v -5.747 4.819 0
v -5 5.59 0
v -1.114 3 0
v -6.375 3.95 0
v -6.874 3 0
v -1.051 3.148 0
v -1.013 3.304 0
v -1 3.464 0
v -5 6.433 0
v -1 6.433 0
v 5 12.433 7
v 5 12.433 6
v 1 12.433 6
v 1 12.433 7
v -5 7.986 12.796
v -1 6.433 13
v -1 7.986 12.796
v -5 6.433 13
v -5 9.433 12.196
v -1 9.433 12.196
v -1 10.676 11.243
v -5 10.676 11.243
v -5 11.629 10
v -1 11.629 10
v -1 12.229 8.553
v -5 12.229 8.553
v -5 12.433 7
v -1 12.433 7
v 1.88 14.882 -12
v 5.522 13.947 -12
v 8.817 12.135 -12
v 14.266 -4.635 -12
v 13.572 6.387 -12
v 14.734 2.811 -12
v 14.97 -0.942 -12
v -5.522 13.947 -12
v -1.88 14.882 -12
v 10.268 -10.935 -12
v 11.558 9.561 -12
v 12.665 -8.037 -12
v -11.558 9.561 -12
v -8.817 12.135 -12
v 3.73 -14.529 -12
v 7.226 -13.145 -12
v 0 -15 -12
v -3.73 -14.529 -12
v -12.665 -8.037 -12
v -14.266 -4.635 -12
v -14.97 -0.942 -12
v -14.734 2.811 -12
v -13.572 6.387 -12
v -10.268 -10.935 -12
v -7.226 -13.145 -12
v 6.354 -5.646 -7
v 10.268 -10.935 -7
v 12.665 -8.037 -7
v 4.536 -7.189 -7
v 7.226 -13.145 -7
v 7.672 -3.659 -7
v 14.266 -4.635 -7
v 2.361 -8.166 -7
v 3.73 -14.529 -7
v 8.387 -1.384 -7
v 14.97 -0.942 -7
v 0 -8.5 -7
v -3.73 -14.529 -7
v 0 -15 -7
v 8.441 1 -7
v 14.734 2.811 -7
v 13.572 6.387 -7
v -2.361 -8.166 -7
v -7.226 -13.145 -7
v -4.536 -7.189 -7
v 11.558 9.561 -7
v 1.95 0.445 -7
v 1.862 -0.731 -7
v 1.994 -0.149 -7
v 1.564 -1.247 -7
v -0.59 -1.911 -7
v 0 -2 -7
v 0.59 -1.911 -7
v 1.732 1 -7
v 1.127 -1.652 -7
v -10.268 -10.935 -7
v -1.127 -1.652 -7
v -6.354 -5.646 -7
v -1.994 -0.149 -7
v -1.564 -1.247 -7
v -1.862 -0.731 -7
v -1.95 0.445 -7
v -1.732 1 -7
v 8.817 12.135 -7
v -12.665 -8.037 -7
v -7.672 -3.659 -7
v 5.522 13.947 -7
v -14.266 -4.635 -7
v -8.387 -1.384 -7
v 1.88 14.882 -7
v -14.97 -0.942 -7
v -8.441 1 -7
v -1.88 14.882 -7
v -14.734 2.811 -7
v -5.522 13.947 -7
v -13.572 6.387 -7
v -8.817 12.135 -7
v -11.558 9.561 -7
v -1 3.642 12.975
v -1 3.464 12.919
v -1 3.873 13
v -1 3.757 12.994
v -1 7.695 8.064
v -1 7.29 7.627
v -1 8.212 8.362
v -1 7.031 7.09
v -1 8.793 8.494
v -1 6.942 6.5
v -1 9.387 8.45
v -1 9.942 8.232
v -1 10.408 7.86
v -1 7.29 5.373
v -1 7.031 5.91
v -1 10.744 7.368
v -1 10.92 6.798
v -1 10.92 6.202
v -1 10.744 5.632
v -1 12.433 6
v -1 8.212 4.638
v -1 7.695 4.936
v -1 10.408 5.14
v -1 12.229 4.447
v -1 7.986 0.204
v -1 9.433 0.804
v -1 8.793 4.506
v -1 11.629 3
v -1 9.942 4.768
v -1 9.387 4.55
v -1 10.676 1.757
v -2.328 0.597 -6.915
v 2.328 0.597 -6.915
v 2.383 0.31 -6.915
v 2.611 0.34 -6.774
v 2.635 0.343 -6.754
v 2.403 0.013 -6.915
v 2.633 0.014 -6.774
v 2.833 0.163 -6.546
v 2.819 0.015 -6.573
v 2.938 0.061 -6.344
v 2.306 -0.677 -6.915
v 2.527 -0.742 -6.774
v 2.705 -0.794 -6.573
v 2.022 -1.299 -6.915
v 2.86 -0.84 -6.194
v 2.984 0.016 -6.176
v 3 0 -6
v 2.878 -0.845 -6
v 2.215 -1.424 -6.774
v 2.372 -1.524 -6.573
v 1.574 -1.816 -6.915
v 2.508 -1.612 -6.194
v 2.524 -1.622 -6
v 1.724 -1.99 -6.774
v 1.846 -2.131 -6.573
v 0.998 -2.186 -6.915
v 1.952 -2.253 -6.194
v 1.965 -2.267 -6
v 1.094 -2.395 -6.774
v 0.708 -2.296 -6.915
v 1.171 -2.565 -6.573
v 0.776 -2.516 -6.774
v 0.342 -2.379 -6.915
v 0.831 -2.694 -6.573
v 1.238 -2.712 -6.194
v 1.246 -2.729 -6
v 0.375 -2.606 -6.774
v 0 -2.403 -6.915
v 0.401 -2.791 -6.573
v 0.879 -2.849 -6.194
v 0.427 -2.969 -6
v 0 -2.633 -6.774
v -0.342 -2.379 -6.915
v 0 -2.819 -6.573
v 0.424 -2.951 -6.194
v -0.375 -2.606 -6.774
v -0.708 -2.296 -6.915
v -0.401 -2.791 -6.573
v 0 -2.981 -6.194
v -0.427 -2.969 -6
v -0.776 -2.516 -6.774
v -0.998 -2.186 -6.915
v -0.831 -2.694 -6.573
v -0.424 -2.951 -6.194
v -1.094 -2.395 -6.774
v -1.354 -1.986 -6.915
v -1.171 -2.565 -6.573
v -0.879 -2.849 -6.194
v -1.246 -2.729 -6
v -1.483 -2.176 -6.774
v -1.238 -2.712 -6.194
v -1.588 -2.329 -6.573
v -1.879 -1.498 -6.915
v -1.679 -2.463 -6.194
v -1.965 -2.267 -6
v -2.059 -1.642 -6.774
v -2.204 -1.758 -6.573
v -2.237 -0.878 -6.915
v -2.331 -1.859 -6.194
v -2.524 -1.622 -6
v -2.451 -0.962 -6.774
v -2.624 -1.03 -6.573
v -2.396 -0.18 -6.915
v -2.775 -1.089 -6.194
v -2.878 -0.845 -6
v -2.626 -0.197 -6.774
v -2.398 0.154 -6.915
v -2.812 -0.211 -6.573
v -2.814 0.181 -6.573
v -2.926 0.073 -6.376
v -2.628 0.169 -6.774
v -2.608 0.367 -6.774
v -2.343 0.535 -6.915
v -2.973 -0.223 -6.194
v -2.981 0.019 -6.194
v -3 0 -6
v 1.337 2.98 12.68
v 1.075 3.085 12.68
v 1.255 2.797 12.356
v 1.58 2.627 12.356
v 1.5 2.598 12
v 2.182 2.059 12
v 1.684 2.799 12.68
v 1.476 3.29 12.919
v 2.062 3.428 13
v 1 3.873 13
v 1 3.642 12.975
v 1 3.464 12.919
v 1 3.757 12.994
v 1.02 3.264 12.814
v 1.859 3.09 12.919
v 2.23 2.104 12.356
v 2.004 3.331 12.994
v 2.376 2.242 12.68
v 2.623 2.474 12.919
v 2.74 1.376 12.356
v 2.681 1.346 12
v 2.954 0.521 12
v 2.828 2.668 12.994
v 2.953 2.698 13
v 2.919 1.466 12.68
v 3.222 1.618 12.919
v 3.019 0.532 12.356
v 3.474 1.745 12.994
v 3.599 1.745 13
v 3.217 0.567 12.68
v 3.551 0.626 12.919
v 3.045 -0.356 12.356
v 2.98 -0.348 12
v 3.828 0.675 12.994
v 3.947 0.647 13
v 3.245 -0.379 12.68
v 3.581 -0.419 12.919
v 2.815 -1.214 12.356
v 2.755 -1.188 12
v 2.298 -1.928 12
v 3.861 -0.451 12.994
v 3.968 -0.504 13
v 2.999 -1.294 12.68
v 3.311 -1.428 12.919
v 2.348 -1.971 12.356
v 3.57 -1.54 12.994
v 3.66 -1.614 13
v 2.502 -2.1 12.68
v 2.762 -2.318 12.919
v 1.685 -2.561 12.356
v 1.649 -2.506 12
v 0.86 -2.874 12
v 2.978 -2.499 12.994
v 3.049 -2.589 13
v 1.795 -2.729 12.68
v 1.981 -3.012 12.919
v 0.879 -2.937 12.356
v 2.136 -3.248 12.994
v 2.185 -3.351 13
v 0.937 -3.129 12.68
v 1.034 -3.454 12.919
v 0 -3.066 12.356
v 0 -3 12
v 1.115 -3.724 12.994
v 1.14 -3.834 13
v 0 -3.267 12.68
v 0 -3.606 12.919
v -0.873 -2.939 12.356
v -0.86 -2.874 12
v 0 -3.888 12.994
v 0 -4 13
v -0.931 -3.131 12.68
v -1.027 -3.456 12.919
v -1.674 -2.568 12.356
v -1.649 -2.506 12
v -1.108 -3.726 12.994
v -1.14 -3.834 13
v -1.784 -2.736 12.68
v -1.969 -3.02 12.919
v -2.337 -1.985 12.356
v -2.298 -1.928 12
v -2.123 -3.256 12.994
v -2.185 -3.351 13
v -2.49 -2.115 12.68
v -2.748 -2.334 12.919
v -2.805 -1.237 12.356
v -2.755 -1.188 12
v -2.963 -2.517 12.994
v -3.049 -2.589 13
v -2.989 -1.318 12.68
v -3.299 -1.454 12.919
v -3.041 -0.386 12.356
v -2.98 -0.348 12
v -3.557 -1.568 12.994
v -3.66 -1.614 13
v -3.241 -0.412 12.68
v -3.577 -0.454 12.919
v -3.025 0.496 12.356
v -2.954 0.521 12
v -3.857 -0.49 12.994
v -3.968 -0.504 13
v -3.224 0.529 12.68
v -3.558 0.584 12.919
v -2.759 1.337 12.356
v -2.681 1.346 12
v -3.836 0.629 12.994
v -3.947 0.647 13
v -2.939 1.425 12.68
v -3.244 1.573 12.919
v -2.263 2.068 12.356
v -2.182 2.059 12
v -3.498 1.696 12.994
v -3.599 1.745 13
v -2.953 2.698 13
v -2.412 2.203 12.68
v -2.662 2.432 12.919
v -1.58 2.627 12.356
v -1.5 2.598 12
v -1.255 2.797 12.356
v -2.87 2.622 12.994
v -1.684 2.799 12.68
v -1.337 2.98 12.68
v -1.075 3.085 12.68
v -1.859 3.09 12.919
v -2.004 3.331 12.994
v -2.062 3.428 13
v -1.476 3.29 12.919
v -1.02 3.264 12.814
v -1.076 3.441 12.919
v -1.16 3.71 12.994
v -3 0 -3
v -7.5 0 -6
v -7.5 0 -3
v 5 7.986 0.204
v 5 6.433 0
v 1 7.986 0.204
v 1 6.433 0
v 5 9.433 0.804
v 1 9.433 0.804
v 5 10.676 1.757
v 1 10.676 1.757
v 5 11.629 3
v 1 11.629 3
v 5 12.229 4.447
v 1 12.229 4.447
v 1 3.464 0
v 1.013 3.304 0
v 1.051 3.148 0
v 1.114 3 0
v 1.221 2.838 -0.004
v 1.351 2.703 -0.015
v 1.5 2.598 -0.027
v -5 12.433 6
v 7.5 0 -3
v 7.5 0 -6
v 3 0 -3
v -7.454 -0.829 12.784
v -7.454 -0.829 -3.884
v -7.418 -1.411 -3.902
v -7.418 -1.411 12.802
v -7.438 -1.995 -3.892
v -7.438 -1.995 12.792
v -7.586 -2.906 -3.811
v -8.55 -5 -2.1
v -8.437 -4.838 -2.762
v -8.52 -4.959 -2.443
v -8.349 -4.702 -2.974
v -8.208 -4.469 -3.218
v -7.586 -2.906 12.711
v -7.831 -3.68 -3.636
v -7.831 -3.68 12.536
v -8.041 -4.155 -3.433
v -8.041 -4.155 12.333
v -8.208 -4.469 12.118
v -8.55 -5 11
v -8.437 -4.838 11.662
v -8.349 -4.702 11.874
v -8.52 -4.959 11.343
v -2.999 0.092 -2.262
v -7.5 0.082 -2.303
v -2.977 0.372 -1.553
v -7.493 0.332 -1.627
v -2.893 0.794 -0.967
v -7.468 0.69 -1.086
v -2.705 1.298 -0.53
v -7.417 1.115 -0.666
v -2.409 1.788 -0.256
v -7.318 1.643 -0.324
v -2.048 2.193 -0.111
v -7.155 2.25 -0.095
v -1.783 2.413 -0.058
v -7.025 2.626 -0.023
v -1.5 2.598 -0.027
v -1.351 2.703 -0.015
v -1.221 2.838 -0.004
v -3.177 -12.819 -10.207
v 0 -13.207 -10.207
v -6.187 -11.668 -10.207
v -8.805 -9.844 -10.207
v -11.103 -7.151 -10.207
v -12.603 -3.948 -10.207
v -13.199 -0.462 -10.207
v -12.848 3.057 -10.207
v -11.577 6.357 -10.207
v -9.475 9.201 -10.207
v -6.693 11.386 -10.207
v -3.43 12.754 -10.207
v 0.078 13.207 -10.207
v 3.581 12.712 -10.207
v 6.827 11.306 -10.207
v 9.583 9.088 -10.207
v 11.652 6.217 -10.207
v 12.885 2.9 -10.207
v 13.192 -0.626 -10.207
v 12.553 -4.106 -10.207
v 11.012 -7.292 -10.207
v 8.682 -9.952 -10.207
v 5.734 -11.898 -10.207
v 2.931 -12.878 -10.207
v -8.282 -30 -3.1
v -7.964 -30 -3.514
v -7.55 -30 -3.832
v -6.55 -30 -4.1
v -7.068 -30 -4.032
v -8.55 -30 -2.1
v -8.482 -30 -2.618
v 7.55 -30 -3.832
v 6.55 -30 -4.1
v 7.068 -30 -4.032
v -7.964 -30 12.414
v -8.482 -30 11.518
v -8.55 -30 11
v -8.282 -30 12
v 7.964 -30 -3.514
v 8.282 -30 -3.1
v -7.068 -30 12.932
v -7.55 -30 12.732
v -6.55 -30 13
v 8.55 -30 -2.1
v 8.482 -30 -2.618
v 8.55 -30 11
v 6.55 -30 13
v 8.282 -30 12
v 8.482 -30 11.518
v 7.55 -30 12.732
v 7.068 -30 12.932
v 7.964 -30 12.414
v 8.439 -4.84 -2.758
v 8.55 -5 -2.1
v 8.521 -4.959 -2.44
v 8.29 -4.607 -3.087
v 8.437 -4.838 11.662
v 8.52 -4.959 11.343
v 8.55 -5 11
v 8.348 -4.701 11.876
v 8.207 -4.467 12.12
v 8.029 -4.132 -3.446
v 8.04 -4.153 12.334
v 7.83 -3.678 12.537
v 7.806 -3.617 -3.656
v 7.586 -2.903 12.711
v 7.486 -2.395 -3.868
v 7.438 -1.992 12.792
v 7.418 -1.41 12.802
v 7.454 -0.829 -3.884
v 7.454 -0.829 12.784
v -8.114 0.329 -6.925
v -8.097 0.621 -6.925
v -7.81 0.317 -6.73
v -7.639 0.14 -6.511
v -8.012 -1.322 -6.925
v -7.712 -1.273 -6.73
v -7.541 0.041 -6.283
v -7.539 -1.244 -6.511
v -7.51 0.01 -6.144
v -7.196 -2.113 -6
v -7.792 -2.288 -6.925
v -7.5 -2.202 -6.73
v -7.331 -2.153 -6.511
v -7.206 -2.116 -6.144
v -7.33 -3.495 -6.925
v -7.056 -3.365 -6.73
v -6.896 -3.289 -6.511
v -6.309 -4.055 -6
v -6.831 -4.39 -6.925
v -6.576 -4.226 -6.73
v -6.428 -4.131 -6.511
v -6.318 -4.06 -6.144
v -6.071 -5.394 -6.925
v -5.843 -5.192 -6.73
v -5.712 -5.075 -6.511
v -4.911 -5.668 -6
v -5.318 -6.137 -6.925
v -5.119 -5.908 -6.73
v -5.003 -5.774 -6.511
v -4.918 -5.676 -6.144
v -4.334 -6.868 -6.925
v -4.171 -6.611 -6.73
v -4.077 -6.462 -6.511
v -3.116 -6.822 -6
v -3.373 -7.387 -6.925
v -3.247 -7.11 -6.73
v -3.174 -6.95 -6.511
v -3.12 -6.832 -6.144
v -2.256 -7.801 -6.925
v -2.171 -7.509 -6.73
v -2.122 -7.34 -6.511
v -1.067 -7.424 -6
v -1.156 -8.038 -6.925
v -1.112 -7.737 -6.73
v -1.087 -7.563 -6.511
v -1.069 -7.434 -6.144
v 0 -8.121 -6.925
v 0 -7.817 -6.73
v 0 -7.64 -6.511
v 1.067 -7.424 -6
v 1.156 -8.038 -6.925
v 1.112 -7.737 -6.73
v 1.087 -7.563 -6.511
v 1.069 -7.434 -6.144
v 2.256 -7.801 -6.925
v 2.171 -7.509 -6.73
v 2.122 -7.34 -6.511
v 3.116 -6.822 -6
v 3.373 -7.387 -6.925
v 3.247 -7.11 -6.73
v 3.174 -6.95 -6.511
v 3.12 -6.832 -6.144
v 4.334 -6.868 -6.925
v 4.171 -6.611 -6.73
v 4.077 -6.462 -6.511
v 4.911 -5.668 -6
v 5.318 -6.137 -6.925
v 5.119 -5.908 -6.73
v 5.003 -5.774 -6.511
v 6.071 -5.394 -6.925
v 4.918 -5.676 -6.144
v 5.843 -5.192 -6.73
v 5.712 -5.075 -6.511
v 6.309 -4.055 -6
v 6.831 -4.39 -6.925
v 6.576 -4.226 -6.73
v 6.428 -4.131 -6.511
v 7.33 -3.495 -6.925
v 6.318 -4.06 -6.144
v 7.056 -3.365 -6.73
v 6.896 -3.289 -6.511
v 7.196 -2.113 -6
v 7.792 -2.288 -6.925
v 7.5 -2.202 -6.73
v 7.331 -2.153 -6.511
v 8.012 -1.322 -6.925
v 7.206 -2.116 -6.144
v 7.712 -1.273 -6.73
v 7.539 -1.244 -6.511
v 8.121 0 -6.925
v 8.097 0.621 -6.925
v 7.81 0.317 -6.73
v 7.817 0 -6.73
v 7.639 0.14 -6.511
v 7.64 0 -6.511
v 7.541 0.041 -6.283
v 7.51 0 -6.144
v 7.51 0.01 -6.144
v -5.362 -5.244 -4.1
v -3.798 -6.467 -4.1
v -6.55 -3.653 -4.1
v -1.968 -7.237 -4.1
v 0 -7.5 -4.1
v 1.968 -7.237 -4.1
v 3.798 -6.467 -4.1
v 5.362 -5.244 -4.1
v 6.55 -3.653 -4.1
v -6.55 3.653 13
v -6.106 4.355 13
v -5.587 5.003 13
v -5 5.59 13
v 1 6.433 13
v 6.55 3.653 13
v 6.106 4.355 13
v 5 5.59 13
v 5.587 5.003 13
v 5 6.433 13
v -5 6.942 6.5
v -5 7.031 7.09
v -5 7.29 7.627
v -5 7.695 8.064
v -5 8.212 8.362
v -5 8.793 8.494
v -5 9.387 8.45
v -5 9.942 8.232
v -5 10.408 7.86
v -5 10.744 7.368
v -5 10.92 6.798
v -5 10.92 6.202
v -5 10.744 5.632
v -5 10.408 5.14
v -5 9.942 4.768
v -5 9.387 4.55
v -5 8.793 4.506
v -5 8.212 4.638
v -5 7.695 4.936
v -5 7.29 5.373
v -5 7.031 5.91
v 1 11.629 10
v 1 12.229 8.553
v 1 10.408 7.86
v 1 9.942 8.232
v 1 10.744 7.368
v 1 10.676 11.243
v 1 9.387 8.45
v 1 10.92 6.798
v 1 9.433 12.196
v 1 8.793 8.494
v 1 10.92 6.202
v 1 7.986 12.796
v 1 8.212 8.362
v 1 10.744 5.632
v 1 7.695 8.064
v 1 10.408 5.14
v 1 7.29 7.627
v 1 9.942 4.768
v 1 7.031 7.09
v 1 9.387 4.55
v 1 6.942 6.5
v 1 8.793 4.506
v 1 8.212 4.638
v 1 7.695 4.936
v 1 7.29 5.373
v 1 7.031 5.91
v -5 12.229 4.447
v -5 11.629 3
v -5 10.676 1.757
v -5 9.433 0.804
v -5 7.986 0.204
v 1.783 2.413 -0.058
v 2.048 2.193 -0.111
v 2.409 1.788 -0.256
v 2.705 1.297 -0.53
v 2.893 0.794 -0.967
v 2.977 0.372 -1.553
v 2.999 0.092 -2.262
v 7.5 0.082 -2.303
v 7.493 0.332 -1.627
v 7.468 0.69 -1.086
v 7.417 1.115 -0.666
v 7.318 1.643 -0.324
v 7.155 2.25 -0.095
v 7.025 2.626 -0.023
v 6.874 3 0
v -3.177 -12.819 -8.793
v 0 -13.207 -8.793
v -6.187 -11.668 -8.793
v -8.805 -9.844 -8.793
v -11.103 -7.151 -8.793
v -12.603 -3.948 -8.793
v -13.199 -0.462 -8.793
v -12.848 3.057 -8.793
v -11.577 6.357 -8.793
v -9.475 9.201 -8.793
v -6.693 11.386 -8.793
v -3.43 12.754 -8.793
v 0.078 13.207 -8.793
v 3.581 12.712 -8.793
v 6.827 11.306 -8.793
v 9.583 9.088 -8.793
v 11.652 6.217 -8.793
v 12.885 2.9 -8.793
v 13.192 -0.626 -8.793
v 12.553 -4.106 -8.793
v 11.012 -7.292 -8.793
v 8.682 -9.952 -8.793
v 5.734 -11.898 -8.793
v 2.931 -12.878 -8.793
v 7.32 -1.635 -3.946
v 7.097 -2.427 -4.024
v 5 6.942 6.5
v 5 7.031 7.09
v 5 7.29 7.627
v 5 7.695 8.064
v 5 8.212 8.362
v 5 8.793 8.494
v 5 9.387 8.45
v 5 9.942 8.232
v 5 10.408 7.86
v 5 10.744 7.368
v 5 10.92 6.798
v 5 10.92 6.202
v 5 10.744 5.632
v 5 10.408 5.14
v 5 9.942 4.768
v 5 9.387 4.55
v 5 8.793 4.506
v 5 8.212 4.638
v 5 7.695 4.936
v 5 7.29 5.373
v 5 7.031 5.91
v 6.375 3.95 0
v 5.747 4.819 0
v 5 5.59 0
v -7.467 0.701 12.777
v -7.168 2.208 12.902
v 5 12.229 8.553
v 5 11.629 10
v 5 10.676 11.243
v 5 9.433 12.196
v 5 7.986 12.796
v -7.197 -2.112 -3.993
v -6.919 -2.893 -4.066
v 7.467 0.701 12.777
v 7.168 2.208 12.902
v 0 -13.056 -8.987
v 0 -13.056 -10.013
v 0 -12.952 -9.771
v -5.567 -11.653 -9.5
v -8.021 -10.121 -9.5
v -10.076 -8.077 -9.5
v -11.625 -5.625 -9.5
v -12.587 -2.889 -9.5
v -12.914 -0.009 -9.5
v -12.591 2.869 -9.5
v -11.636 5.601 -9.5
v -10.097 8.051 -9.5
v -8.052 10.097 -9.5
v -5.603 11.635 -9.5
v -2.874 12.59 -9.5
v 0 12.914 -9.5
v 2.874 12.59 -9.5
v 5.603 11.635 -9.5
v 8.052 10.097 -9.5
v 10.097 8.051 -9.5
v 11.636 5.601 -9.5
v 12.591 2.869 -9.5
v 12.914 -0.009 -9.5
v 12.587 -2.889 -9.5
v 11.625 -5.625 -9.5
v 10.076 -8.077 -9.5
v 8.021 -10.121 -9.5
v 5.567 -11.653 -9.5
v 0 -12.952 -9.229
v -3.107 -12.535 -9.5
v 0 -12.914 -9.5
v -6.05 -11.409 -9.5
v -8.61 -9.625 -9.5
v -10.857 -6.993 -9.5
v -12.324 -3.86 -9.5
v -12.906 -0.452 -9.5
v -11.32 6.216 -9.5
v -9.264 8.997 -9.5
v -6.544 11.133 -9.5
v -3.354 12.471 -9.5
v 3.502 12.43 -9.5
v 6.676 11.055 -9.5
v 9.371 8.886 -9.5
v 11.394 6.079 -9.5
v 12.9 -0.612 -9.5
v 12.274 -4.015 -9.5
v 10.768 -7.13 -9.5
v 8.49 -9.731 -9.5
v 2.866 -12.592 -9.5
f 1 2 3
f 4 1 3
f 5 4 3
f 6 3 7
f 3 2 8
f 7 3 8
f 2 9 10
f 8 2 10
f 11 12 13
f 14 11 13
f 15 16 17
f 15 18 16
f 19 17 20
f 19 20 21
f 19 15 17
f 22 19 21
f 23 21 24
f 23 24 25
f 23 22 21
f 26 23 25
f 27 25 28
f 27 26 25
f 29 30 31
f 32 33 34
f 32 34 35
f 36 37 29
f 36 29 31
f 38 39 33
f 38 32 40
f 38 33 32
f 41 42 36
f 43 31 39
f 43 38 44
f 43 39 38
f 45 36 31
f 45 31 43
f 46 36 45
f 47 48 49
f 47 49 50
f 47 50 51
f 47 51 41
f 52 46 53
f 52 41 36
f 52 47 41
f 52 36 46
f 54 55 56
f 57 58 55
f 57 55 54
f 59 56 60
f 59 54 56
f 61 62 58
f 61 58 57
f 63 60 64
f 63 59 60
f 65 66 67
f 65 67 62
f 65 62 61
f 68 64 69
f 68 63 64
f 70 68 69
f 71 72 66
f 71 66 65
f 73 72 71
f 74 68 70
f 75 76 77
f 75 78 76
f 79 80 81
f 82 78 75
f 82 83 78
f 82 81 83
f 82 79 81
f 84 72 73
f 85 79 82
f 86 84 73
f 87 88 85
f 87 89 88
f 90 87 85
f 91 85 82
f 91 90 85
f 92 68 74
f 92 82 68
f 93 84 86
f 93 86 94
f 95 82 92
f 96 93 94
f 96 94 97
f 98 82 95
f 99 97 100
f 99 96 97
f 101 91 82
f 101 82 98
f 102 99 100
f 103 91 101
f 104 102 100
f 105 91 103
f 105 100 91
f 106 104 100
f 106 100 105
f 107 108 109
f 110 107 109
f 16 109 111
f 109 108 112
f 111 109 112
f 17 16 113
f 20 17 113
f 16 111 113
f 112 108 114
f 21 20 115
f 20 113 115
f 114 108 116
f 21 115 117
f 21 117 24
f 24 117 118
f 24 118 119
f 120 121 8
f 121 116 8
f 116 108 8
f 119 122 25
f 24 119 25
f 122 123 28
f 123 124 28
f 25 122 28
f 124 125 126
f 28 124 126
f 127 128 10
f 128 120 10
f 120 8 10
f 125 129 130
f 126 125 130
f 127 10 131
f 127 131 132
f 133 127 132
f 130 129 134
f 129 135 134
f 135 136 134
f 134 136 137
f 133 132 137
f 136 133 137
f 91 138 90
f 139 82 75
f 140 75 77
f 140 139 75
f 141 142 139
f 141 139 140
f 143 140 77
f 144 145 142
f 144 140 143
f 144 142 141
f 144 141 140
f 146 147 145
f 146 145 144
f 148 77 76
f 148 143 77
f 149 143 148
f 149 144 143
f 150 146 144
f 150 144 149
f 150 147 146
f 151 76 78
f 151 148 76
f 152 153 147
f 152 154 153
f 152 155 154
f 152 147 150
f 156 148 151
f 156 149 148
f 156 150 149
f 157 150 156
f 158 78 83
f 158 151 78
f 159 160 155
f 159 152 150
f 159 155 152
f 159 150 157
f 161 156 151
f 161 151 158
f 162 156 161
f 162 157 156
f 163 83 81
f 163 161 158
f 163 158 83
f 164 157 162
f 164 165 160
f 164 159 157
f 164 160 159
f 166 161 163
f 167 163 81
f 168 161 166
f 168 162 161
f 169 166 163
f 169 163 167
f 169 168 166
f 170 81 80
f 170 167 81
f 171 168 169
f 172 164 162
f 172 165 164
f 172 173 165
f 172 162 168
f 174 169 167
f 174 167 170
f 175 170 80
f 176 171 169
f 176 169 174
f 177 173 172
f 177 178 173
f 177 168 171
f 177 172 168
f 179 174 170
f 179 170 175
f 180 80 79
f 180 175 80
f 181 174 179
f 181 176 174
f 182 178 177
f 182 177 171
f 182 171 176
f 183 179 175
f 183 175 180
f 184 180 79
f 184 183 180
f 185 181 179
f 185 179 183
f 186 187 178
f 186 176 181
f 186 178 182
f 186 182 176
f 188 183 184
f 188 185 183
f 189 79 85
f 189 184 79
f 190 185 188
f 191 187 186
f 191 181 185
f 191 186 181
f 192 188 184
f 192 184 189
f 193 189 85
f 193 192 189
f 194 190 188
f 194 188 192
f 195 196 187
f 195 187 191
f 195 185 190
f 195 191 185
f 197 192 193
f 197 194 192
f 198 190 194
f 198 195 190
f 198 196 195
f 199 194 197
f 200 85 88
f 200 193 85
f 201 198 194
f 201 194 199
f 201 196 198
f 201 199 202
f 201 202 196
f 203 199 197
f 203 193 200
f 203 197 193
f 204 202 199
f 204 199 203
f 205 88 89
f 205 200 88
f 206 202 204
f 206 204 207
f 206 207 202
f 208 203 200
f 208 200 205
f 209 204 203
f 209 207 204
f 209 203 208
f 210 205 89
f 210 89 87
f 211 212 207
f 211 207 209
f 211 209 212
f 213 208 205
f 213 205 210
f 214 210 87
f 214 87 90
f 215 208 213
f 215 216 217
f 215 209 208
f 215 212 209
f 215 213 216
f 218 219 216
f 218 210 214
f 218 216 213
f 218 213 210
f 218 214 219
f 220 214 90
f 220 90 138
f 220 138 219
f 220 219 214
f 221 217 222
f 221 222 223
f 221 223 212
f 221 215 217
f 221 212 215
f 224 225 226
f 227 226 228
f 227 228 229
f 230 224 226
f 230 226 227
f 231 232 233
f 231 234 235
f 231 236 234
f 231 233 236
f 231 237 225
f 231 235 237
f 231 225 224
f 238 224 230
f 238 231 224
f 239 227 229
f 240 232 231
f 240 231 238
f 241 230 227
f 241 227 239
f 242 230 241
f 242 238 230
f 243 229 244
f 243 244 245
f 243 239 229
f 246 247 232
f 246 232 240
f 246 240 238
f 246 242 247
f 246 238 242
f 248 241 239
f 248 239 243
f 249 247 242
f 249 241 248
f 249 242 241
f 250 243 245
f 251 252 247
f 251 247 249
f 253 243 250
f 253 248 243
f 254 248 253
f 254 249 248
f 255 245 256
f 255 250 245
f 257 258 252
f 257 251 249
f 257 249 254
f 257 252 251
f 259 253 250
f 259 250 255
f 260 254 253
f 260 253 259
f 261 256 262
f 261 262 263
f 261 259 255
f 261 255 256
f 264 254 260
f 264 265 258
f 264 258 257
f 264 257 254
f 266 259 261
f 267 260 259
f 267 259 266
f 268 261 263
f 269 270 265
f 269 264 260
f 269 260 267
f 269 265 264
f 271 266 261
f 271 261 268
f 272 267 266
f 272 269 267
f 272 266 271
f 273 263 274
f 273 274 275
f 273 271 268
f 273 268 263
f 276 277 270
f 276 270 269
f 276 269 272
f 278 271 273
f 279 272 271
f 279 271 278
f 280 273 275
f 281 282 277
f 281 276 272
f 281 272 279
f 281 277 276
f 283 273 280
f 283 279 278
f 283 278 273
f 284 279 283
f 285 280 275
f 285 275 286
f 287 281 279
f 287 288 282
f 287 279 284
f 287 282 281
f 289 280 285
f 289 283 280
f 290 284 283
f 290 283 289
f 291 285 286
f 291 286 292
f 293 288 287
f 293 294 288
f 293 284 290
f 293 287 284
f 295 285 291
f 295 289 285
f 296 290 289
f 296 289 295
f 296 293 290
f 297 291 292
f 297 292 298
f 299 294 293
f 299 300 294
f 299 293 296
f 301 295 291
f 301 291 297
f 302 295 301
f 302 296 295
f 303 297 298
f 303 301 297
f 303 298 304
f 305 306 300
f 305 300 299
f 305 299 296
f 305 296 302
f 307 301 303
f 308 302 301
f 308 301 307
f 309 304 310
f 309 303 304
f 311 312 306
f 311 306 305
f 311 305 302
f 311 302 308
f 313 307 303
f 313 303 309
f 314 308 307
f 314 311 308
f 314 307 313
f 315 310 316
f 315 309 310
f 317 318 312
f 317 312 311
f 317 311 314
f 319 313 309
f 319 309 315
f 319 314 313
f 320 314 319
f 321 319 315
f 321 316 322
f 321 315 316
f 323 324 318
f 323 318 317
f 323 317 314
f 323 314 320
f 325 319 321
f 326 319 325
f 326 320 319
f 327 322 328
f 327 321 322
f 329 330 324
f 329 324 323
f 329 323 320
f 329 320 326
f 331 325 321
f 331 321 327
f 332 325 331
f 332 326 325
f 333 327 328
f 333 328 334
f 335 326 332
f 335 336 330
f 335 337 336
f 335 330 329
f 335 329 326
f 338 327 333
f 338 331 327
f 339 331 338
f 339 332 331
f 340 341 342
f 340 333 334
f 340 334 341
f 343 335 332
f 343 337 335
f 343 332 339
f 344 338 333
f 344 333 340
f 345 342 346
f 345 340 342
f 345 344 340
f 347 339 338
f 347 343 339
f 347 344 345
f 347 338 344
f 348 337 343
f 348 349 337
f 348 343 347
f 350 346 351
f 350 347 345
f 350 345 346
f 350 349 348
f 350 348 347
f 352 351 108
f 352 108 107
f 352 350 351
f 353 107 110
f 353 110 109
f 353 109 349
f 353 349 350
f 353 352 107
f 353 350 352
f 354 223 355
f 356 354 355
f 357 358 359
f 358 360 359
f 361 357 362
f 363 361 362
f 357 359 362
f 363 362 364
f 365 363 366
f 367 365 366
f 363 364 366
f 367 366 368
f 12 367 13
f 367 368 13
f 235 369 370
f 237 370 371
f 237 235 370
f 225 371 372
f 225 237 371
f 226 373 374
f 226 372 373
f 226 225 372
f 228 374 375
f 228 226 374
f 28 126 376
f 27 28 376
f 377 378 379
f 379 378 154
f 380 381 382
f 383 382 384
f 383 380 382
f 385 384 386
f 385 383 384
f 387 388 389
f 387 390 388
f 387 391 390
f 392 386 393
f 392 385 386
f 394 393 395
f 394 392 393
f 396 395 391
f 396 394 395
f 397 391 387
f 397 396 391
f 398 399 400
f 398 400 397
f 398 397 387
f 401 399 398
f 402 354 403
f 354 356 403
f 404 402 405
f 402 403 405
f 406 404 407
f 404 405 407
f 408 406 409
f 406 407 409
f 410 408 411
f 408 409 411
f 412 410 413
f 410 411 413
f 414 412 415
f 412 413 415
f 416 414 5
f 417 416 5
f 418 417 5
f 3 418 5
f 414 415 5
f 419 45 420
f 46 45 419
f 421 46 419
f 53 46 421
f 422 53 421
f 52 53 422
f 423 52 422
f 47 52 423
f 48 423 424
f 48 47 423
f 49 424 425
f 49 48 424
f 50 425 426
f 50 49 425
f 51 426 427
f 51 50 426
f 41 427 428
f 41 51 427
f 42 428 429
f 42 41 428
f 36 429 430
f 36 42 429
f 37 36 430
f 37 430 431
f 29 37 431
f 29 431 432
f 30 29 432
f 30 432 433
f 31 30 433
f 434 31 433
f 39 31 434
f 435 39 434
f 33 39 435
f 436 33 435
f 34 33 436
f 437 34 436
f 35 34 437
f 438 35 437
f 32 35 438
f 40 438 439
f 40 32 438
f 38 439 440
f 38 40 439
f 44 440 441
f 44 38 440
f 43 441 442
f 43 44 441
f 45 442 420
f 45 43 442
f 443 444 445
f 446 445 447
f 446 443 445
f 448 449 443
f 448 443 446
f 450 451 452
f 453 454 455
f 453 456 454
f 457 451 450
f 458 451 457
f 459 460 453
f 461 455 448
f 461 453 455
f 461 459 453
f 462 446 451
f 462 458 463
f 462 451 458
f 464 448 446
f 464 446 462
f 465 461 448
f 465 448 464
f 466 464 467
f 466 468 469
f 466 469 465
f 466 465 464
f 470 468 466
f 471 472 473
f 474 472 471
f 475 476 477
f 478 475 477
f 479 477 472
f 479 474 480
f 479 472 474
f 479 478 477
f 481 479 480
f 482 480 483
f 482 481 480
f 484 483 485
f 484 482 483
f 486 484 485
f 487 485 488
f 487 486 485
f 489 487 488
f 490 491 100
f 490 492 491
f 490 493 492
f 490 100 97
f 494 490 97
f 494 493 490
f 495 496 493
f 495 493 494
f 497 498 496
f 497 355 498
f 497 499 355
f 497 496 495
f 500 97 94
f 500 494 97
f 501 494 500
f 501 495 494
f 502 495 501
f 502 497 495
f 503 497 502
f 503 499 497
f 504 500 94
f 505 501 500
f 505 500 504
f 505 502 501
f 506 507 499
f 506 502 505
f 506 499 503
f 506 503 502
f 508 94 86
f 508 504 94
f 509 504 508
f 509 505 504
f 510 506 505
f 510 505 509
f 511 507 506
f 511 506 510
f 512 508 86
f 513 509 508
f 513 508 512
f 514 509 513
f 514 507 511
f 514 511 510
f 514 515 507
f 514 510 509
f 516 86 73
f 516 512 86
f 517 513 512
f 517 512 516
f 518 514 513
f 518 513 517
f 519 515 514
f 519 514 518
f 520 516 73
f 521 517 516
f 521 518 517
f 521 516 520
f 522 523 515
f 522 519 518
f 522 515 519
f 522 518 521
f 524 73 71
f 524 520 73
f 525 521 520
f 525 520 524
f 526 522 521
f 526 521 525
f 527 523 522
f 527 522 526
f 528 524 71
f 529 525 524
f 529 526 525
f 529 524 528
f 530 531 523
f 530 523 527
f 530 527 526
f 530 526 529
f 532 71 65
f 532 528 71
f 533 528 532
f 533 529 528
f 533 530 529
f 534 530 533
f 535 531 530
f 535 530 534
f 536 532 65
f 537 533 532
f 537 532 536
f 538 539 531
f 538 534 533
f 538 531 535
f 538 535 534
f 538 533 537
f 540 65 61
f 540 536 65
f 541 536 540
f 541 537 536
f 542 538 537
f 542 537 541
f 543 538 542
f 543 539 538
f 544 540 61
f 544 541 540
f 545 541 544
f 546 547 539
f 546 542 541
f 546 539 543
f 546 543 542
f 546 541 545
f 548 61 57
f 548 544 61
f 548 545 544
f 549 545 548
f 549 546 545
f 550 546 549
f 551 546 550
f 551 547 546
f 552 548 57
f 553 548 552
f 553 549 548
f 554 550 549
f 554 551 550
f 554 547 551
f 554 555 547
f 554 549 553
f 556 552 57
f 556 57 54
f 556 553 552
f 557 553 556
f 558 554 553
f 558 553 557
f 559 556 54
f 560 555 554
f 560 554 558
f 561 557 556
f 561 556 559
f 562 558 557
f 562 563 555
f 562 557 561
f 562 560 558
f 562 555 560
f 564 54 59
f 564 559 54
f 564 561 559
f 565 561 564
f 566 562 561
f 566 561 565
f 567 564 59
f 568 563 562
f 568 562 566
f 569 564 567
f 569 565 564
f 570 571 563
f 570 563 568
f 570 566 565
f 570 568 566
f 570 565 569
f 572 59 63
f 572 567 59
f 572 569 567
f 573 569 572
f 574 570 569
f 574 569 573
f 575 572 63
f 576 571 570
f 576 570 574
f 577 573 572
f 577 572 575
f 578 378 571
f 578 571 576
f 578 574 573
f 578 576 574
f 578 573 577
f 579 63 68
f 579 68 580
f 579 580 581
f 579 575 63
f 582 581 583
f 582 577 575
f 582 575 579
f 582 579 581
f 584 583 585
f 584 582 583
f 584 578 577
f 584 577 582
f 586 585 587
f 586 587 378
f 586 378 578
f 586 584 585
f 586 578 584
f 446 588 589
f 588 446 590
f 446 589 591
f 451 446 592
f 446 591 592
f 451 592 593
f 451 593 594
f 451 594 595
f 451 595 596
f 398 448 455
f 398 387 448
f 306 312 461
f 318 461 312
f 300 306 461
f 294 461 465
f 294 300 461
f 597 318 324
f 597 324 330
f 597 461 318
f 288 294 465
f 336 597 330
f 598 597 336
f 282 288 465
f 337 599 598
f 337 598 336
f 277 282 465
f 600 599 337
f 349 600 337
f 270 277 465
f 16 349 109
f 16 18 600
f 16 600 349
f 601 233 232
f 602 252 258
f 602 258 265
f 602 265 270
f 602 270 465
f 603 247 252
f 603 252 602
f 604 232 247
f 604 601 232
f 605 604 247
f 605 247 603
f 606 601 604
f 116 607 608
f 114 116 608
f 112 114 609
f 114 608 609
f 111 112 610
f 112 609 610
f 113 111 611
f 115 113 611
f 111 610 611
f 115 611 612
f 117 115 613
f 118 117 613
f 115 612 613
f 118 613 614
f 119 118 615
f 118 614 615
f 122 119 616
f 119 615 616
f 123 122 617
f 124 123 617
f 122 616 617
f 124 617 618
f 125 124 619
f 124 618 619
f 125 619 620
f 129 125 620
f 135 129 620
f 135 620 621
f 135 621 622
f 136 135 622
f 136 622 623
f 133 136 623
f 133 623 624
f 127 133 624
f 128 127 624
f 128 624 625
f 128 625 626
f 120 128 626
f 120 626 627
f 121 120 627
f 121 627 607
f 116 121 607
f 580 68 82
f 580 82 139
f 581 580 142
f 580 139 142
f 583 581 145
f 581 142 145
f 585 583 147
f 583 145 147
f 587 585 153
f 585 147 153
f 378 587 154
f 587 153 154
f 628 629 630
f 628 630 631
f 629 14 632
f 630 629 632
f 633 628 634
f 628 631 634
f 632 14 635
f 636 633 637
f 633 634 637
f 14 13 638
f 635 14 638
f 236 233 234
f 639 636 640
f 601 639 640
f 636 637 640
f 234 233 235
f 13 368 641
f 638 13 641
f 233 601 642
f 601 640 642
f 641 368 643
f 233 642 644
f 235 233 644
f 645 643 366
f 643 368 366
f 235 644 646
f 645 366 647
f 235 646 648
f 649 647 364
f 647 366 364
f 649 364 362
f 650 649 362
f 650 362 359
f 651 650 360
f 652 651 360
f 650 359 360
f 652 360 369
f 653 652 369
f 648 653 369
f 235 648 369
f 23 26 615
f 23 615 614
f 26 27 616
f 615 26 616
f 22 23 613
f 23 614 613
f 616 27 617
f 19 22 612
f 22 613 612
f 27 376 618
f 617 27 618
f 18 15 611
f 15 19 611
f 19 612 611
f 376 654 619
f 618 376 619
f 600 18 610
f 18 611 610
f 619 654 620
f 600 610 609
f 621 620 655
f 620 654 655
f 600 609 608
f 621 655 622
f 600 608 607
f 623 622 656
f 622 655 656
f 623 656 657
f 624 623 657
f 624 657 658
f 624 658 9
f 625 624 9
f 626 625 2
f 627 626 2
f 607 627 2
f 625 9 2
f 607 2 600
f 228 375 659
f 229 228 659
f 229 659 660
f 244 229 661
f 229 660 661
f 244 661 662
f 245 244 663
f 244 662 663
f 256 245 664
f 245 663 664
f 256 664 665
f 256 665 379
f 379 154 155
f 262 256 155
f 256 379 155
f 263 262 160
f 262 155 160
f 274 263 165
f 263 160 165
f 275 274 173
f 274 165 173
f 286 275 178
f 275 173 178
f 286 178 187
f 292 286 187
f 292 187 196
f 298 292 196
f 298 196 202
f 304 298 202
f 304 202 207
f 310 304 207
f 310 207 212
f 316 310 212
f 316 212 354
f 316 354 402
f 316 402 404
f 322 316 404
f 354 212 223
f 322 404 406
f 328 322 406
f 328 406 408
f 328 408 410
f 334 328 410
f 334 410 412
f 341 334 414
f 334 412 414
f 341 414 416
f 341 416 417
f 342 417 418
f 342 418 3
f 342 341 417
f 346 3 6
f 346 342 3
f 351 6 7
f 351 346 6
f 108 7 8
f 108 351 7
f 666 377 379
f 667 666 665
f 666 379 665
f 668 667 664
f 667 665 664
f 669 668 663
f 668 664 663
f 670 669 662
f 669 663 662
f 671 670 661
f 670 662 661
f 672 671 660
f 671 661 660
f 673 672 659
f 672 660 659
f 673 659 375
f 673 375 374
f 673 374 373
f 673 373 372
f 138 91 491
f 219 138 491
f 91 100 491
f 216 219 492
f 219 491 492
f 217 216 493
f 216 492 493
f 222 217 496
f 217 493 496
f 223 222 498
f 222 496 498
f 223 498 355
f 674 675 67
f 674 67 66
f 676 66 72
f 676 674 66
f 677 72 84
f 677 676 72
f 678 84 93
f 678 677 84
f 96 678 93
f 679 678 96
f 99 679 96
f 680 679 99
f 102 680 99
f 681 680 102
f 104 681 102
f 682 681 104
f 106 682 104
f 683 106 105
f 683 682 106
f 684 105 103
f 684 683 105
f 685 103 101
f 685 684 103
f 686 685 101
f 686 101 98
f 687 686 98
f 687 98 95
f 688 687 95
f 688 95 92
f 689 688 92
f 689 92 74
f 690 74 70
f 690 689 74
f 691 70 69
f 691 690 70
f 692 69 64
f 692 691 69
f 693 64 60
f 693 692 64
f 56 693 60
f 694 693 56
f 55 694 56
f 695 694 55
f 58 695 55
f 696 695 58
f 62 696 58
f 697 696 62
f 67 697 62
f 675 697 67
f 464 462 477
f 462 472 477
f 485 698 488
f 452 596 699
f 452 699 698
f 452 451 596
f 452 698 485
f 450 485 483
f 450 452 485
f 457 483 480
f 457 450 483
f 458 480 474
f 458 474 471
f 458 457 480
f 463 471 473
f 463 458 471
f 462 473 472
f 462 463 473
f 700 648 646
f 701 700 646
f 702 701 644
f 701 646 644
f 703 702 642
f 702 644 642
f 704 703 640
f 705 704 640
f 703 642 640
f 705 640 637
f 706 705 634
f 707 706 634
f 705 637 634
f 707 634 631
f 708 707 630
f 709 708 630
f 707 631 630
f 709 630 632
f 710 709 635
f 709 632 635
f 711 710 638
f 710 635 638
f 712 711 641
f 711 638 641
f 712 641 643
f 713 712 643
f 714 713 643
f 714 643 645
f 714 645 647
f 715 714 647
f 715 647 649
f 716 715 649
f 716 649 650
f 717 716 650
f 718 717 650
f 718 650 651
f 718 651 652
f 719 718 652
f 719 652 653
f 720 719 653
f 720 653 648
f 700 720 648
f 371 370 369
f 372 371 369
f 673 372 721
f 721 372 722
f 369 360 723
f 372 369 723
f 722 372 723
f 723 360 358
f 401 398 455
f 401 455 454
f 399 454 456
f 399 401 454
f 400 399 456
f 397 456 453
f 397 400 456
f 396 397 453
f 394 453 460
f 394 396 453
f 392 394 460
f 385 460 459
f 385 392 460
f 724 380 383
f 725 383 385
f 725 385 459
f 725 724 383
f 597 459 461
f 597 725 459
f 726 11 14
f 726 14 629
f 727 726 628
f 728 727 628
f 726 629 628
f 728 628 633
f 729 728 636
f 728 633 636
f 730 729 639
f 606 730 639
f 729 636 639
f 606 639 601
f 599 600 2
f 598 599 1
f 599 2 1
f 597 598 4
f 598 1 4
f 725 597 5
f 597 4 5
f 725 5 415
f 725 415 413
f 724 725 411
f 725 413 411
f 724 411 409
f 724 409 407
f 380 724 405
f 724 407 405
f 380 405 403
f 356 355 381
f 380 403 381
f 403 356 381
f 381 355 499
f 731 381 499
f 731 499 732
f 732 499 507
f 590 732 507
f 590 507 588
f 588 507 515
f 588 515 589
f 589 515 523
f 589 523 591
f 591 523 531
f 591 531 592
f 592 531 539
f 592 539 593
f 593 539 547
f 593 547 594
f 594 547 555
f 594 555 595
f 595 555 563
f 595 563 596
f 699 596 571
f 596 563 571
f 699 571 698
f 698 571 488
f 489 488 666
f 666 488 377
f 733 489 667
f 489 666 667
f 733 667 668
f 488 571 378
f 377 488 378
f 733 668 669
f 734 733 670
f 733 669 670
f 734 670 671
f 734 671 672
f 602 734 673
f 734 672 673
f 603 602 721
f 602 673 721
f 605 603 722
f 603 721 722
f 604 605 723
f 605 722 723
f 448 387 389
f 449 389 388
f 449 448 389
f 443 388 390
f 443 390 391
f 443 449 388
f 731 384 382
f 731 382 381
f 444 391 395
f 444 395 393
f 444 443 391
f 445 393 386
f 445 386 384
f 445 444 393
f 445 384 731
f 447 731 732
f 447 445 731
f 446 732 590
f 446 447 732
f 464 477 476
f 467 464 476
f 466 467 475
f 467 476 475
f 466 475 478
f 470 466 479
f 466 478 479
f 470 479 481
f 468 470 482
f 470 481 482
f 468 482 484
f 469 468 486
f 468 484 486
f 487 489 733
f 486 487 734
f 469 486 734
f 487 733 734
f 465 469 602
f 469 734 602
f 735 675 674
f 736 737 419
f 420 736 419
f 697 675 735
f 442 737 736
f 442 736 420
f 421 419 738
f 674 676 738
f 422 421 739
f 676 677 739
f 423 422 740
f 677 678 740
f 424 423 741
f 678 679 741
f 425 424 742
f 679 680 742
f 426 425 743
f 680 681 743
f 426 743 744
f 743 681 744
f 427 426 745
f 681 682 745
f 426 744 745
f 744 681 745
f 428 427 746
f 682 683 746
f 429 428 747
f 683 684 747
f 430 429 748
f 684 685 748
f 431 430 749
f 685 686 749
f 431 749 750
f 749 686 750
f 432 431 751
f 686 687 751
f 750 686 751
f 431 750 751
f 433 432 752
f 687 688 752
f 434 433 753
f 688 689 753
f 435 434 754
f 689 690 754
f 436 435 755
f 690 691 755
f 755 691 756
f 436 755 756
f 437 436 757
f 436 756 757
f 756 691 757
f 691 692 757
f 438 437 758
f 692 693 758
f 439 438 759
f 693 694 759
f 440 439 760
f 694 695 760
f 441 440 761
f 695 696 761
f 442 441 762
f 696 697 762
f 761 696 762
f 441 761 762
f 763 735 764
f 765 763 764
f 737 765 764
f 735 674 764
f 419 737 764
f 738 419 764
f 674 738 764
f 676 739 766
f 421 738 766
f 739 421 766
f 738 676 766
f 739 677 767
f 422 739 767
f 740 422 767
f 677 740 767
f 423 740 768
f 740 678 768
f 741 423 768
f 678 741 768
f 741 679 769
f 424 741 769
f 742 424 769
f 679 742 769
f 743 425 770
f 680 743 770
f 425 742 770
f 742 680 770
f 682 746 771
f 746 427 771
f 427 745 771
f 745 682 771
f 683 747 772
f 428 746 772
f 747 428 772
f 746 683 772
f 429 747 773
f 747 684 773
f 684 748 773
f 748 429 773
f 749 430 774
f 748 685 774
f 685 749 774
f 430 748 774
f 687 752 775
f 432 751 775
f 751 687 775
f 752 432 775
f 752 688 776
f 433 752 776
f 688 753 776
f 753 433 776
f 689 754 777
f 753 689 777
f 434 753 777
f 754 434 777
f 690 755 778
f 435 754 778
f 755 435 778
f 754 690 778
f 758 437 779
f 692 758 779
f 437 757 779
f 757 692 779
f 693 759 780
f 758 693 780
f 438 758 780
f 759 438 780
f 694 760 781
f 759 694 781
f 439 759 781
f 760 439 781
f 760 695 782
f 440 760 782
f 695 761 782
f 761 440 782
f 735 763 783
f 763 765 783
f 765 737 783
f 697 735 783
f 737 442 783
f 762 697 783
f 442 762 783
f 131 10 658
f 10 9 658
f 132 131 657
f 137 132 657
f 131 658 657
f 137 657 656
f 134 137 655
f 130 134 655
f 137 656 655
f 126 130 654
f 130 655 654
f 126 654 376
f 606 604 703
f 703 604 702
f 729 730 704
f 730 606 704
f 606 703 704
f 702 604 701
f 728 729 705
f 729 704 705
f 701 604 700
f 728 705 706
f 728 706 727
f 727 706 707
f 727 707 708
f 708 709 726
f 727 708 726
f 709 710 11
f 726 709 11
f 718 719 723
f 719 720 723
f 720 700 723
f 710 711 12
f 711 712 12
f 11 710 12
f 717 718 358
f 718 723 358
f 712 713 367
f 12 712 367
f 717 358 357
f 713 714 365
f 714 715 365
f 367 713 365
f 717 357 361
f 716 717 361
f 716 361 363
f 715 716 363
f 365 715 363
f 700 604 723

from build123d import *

# Parameters (mm, degrees)
BOSS_EXTRUDE1_DEPTH = 13
FILLET1_R           = 1
FILLET2_R           = 6
BOSS_EXTRUDE2_START = 7
BOSS_EXTRUDE2_DEPTH = 7
SKETCH3_W           = 17.1
SKETCH3_H           = 5
BOSS_EXTRUDE3_DEPTH = 17.1
FILLET3_R           = 6
SKETCH4_W           = 17.1
SKETCH4_H           = 17.1
BOSS_EXTRUDE4_DEPTH = 20
FILLET4_R           = 2
FILLET6_R           = 1
FILLET7_R           = 1
SKETCH6_R           = 1.9999999999999987
CUT_EXTRUDE1_DEPTH  = 14.000000000000002
FILLET8_R           = 3


with BuildPart() as part:
    # Sketch1 → Boss-Extrude1 (new body)
    with BuildSketch(Plane.XY):
        with BuildLine():
            Line((-0.9999999999999998, 7.433034373659251), (-1.0000000000000002, 12.433034373659252))
            Line((-1.0000000000000002, 12.433034373659252), (-5, 12.433034373659252))
            Line((-5, 12.433034373659252), (-4.999999999999999, 5.590169943749475))
            ThreePointArc((-4.999999999999999, 5.590169943749475), (-1.38e-15, -7.5), (4.999999999999999, 5.5901699437494745))
            Line((4.999999999999999, 5.5901699437494745), (5, 12.433034373659252))
            Line((5, 12.433034373659252), (0.9999999999999998, 12.433034373659252))
            Line((0.9999999999999998, 12.433034373659252), (0.9999999999999993, 7.433034373659251))
            Line((0.9999999999999993, 7.433034373659251), (0.9999999999999998, 2.8284271247461907))
            ThreePointArc((0.9999999999999998, 2.8284271247461907), (-5.5e-16, -3.0000000000000004), (-1.0000000000000002, 2.8284271247461903))
            Line((-1.0000000000000002, 2.8284271247461903), (-0.9999999999999998, 7.433034373659251))
        make_face()
    extrude(amount=BOSS_EXTRUDE1_DEPTH)

    # Fillet1
    fillet1_edges = [part.edges().sort_by_distance(p)[0] for p in [
        (-1.0000000000000004, 2.8284271247461907, 6.5),
        (0.9999999999999998, 2.8284271247461907, 6.5),
        (-4.7e-16, -3.0000000000000004, 13),
    ]]
    fillet(fillet1_edges, radius=FILLET1_R)

    # Fillet2
    fillet2_edges = [part.edges().sort_by_distance(p)[0] for p in [
        (-3, 12.433034373659252, 13),
        (3, 12.433034373659252, 0),
        (-3, 12.433034373659252, 0),
        (3, 12.433034373659252, 13),
    ]]
    fillet(fillet2_edges, radius=FILLET2_R)

    # Sketch2 → Boss-Extrude2 (add)
    with BuildSketch(Plane(origin=(0, 0, 0), x_dir=(-1, 0, 0), z_dir=(0, 0, -1)).offset(BOSS_EXTRUDE2_START)):
        with BuildLine():
            Line((-7.5, 0), (-3.0000000000000004, 0))
            ThreePointArc((-3.0000000000000004, 0), (-5.5e-16, -3.0000000000000004), (3.0000000000000004, 0))
            Line((3.0000000000000004, 0), (7.5, 0))
            ThreePointArc((7.5, 0), (-1.38e-15, -7.5), (-7.5, 0))
        make_face()
    extrude(amount=-BOSS_EXTRUDE2_DEPTH)

    # Sketch3 → Boss-Extrude3 (add)
    with BuildSketch(Plane.XY.offset(13)):
        with Locations((1.78e-15, -7.5)):
            Rectangle(SKETCH3_W, SKETCH3_H)
    extrude(amount=-BOSS_EXTRUDE3_DEPTH)

    # Fillet3
    # the kernel refuses this fillet: 6 mm, written as the material it adds along each edge
    with BuildSketch(Plane(origin=(5.590169943749475, -5, 13), x_dir=(0.407962135259343, 0.9129988478605203, 0), z_dir=(0, 0, -1))) as fillet3_piece_1:
        with BuildLine():
            CenterArc((6.396366403246306, 5.714903515427595), FILLET3_R, 210.13883458163096, 42.12773397862901)
            Line((1.2074985897527464, 2.70232143121967), (1.1037212334828754, 2.642069789535512))
            ThreePointArc((1.1037212334828754, 2.642069789535512), (0.4941894331331104, 1.4001161718409558), (-0.10955986174326253, 0.0489554562311212))
            Line((-0.10955986174326253, 0.0489554562311212), (0.03655066516140769, -0.11429807030855153))
            ThreePointArc((0.03655066516140769, -0.11429807030855153), (2.2844165725879635, 0.23637060571550603), (4.5322824800145245, -0.11429807030855171))
            Line((4.5322824800145245, -0.11429807030855171), (4.568833145175932, -9e-17))
        make_face()
    extrude(amount=17.1)
    with BuildSketch(Plane(origin=(-5.590169943749474, -5, 13), x_dir=(-0.40796213525934283, 0.9129988478605204, 0), z_dir=(0, 0, -1))) as fillet3_piece_2:
        with BuildLine():
            CenterArc((6.396366403246302, -5.714903515427596), FILLET3_R, 107.73343143974, 42.12773397862901)
            Line((1.2074985897527435, -2.702321431219668), (1.1037212334828725, -2.642069789535509))
            ThreePointArc((1.1037212334828725, -2.642069789535509), (0.4941894331331094, -1.4001161718409545), (-0.10955986174326254, -0.04895545623112119))
            Line((-0.10955986174326254, -0.04895545623112119), (0.03655066516140771, 0.11429807030855152))
            ThreePointArc((0.03655066516140771, 0.11429807030855152), (2.284416572587965, -0.23637060571550497), (4.532282480014523, 0.11429807030855221))
            Line((4.532282480014523, 0.11429807030855221), (4.56883314517593, 0))
        make_face()
    extrude(amount=17.1)

    # Sketch4 → Boss-Extrude4 (add)
    with BuildSketch(Plane.XZ.offset(10)):
        with Locations((1.78e-15, 4.45)):
            Rectangle(SKETCH4_W, SKETCH4_H)
    extrude(amount=BOSS_EXTRUDE4_DEPTH)

    # Fillet4
    fillet4_edges = [part.edges().sort_by_distance(p)[0] for p in [
        (8.549999999999962, -17.499999999999645, 13),
        (8.549999999999962, -17.499999999999645, -4.100000000000001),
        (-8.54999999999996, -17.499999999999645, 13),
        (-8.54999999999996, -17.499999999999645, -4.100000000000001),
    ]]
    fillet(fillet4_edges, radius=FILLET4_R)

    # Sketch5 → Revolve1 (revolve)
    with BuildSketch(Plane(origin=(0, 0, 0), x_dir=(0, 0, -1), z_dir=(1, 0, 0))):
        Polygon((6.999999999999999, -8.7e-16), (7.000000000000001, -15), (9.499999999999998, -12.5), (12, -15), (12, 0), align=None)
    revolve(axis=Axis((0, 0, 0), (0, -1.2e-16, -1)))

    # Fillet6
    fillet6_edges = [part.edges().sort_by_distance(p)[0] for p in [
        (4.1e-16, -3, -7),
        (5.25, 0, -7),
        (-1.01e-15, -7.499999999999999, -7),
        (-5.25, 0, -7),
    ]]
    fillet(fillet6_edges, radius=FILLET6_R)

    # Fillet7
    fillet7_edges = [part.edges().sort_by_distance(p)[0] for p in [
        (-1.53e-15, 12.499999999999996, -9.500000000000002),
    ]]
    fillet(fillet7_edges, radius=FILLET7_R)

    # Sketch6 → Cut-Extrude1 (cut)
    with BuildSketch(Plane.ZY.offset(4.999999999999998)):
        with Locations(Location((6.500000000000002, 8.942387299959254, 0), (0, 0, 270))):
            Circle(SKETCH6_R)
    extrude(amount=-CUT_EXTRUDE1_DEPTH, mode=Mode.SUBTRACT)

    # Fillet8
    fillet8_edges = [part.edges().sort_by_distance(p)[0] for p in [
        (5.25, 0, 0),
        (-5.25, 0, 0),
    ]]
    fillet(fillet8_edges, radius=FILLET8_R)


solid = part.part
